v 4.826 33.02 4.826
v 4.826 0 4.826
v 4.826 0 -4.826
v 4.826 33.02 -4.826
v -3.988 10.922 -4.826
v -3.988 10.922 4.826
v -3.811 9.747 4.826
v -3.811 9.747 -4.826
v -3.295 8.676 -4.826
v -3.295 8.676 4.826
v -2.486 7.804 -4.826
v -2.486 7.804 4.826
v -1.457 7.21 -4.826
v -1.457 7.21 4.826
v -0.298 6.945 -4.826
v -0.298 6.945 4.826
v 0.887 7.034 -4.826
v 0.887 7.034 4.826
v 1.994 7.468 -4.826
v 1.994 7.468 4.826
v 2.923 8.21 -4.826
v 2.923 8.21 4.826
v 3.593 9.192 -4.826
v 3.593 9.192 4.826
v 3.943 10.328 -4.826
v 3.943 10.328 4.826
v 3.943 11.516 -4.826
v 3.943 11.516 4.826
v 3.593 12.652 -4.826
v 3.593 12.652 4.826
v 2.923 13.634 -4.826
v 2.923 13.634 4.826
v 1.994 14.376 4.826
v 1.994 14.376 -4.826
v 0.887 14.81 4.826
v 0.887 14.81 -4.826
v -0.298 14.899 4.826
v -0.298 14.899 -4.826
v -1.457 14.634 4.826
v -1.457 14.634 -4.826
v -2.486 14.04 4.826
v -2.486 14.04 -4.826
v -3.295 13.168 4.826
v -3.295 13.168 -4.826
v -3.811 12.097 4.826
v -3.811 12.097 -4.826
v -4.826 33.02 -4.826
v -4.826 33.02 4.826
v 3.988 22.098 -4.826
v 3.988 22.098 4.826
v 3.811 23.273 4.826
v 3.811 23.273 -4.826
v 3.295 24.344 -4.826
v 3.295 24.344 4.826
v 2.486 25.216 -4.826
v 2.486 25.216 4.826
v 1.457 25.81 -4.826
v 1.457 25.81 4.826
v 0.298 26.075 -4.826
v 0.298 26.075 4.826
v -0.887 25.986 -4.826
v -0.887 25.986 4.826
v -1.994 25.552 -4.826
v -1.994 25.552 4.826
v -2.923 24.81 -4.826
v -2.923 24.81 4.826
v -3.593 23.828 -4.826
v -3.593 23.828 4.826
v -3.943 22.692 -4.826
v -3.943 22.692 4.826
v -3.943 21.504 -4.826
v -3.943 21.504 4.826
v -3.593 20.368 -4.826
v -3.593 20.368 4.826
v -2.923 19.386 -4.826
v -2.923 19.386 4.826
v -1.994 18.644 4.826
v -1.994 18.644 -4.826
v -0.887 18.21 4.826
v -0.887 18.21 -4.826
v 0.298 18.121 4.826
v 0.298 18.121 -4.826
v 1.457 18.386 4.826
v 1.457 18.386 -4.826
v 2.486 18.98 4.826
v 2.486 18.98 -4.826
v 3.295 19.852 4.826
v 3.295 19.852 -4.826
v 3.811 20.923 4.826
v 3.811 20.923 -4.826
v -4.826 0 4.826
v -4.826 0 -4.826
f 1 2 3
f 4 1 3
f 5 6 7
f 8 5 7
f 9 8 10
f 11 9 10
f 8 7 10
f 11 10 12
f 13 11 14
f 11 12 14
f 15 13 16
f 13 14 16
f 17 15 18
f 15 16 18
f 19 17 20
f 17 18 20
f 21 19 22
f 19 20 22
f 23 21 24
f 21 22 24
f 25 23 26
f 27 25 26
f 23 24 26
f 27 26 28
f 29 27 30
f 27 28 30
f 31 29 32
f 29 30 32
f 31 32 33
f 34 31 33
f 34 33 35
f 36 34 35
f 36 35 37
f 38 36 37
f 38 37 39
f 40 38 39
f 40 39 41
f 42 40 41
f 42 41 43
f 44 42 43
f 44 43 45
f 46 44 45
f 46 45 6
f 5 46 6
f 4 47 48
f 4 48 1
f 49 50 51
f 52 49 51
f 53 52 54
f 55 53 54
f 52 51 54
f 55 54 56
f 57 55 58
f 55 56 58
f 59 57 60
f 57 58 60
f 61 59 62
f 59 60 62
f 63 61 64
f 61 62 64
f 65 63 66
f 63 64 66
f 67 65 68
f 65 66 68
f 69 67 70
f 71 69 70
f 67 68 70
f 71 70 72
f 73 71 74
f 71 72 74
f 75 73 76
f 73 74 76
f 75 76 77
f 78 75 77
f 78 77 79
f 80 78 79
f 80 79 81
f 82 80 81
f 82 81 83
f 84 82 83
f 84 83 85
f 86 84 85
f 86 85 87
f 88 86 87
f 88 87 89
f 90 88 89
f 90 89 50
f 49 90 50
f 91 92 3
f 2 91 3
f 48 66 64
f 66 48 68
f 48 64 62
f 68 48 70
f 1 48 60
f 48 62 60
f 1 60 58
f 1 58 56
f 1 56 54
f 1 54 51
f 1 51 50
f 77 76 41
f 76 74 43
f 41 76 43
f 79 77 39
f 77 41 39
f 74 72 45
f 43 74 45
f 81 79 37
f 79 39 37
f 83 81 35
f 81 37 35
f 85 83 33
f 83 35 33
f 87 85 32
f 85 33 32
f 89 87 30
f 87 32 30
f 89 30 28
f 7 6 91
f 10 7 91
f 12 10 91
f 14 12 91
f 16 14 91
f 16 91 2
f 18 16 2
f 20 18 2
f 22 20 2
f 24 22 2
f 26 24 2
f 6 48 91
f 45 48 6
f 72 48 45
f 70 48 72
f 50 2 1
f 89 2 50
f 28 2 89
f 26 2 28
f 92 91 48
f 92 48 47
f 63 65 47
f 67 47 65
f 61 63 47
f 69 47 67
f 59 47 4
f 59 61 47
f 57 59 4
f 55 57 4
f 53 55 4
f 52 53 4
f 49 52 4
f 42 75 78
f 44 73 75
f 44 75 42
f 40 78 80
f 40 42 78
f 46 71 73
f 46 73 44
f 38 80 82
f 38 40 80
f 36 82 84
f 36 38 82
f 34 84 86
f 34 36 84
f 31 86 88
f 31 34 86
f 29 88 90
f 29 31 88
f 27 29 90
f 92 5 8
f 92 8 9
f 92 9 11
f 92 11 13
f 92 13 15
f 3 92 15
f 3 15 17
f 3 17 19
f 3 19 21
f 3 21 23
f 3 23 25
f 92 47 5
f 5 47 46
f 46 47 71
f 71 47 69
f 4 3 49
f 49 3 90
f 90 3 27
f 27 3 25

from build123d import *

# Parameters (mm, degrees)
SKETCH1_W           = 9.652
SKETCH1_H           = 9.652
BOSS_EXTRUDE1_DEPTH = 33.02
SKETCH2_R           = 3.9878
CUT_EXTRUDE1_DEPTH  = 35.738620871


with BuildPart() as part:
    # Sketch1 → Boss-Extrude1 (new body)
    with BuildSketch(Plane(origin=(0, 0, 0), x_dir=(1, 0, 0), z_dir=(0, 1, 0))):
        Rectangle(SKETCH1_W, SKETCH1_H)
    extrude(amount=BOSS_EXTRUDE1_DEPTH)

    # Sketch2 → Cut-Extrude1 (cut, through all)
    with BuildSketch(Plane.XY.offset(4.826)):
        with Locations((0, 22.098)):
            Circle(SKETCH2_R)
        with Locations(Location((0, 10.922, 0), (0, 0, 180))):
            Circle(SKETCH2_R)
    extrude(amount=-CUT_EXTRUDE1_DEPTH, mode=Mode.SUBTRACT)


solid = part.part
